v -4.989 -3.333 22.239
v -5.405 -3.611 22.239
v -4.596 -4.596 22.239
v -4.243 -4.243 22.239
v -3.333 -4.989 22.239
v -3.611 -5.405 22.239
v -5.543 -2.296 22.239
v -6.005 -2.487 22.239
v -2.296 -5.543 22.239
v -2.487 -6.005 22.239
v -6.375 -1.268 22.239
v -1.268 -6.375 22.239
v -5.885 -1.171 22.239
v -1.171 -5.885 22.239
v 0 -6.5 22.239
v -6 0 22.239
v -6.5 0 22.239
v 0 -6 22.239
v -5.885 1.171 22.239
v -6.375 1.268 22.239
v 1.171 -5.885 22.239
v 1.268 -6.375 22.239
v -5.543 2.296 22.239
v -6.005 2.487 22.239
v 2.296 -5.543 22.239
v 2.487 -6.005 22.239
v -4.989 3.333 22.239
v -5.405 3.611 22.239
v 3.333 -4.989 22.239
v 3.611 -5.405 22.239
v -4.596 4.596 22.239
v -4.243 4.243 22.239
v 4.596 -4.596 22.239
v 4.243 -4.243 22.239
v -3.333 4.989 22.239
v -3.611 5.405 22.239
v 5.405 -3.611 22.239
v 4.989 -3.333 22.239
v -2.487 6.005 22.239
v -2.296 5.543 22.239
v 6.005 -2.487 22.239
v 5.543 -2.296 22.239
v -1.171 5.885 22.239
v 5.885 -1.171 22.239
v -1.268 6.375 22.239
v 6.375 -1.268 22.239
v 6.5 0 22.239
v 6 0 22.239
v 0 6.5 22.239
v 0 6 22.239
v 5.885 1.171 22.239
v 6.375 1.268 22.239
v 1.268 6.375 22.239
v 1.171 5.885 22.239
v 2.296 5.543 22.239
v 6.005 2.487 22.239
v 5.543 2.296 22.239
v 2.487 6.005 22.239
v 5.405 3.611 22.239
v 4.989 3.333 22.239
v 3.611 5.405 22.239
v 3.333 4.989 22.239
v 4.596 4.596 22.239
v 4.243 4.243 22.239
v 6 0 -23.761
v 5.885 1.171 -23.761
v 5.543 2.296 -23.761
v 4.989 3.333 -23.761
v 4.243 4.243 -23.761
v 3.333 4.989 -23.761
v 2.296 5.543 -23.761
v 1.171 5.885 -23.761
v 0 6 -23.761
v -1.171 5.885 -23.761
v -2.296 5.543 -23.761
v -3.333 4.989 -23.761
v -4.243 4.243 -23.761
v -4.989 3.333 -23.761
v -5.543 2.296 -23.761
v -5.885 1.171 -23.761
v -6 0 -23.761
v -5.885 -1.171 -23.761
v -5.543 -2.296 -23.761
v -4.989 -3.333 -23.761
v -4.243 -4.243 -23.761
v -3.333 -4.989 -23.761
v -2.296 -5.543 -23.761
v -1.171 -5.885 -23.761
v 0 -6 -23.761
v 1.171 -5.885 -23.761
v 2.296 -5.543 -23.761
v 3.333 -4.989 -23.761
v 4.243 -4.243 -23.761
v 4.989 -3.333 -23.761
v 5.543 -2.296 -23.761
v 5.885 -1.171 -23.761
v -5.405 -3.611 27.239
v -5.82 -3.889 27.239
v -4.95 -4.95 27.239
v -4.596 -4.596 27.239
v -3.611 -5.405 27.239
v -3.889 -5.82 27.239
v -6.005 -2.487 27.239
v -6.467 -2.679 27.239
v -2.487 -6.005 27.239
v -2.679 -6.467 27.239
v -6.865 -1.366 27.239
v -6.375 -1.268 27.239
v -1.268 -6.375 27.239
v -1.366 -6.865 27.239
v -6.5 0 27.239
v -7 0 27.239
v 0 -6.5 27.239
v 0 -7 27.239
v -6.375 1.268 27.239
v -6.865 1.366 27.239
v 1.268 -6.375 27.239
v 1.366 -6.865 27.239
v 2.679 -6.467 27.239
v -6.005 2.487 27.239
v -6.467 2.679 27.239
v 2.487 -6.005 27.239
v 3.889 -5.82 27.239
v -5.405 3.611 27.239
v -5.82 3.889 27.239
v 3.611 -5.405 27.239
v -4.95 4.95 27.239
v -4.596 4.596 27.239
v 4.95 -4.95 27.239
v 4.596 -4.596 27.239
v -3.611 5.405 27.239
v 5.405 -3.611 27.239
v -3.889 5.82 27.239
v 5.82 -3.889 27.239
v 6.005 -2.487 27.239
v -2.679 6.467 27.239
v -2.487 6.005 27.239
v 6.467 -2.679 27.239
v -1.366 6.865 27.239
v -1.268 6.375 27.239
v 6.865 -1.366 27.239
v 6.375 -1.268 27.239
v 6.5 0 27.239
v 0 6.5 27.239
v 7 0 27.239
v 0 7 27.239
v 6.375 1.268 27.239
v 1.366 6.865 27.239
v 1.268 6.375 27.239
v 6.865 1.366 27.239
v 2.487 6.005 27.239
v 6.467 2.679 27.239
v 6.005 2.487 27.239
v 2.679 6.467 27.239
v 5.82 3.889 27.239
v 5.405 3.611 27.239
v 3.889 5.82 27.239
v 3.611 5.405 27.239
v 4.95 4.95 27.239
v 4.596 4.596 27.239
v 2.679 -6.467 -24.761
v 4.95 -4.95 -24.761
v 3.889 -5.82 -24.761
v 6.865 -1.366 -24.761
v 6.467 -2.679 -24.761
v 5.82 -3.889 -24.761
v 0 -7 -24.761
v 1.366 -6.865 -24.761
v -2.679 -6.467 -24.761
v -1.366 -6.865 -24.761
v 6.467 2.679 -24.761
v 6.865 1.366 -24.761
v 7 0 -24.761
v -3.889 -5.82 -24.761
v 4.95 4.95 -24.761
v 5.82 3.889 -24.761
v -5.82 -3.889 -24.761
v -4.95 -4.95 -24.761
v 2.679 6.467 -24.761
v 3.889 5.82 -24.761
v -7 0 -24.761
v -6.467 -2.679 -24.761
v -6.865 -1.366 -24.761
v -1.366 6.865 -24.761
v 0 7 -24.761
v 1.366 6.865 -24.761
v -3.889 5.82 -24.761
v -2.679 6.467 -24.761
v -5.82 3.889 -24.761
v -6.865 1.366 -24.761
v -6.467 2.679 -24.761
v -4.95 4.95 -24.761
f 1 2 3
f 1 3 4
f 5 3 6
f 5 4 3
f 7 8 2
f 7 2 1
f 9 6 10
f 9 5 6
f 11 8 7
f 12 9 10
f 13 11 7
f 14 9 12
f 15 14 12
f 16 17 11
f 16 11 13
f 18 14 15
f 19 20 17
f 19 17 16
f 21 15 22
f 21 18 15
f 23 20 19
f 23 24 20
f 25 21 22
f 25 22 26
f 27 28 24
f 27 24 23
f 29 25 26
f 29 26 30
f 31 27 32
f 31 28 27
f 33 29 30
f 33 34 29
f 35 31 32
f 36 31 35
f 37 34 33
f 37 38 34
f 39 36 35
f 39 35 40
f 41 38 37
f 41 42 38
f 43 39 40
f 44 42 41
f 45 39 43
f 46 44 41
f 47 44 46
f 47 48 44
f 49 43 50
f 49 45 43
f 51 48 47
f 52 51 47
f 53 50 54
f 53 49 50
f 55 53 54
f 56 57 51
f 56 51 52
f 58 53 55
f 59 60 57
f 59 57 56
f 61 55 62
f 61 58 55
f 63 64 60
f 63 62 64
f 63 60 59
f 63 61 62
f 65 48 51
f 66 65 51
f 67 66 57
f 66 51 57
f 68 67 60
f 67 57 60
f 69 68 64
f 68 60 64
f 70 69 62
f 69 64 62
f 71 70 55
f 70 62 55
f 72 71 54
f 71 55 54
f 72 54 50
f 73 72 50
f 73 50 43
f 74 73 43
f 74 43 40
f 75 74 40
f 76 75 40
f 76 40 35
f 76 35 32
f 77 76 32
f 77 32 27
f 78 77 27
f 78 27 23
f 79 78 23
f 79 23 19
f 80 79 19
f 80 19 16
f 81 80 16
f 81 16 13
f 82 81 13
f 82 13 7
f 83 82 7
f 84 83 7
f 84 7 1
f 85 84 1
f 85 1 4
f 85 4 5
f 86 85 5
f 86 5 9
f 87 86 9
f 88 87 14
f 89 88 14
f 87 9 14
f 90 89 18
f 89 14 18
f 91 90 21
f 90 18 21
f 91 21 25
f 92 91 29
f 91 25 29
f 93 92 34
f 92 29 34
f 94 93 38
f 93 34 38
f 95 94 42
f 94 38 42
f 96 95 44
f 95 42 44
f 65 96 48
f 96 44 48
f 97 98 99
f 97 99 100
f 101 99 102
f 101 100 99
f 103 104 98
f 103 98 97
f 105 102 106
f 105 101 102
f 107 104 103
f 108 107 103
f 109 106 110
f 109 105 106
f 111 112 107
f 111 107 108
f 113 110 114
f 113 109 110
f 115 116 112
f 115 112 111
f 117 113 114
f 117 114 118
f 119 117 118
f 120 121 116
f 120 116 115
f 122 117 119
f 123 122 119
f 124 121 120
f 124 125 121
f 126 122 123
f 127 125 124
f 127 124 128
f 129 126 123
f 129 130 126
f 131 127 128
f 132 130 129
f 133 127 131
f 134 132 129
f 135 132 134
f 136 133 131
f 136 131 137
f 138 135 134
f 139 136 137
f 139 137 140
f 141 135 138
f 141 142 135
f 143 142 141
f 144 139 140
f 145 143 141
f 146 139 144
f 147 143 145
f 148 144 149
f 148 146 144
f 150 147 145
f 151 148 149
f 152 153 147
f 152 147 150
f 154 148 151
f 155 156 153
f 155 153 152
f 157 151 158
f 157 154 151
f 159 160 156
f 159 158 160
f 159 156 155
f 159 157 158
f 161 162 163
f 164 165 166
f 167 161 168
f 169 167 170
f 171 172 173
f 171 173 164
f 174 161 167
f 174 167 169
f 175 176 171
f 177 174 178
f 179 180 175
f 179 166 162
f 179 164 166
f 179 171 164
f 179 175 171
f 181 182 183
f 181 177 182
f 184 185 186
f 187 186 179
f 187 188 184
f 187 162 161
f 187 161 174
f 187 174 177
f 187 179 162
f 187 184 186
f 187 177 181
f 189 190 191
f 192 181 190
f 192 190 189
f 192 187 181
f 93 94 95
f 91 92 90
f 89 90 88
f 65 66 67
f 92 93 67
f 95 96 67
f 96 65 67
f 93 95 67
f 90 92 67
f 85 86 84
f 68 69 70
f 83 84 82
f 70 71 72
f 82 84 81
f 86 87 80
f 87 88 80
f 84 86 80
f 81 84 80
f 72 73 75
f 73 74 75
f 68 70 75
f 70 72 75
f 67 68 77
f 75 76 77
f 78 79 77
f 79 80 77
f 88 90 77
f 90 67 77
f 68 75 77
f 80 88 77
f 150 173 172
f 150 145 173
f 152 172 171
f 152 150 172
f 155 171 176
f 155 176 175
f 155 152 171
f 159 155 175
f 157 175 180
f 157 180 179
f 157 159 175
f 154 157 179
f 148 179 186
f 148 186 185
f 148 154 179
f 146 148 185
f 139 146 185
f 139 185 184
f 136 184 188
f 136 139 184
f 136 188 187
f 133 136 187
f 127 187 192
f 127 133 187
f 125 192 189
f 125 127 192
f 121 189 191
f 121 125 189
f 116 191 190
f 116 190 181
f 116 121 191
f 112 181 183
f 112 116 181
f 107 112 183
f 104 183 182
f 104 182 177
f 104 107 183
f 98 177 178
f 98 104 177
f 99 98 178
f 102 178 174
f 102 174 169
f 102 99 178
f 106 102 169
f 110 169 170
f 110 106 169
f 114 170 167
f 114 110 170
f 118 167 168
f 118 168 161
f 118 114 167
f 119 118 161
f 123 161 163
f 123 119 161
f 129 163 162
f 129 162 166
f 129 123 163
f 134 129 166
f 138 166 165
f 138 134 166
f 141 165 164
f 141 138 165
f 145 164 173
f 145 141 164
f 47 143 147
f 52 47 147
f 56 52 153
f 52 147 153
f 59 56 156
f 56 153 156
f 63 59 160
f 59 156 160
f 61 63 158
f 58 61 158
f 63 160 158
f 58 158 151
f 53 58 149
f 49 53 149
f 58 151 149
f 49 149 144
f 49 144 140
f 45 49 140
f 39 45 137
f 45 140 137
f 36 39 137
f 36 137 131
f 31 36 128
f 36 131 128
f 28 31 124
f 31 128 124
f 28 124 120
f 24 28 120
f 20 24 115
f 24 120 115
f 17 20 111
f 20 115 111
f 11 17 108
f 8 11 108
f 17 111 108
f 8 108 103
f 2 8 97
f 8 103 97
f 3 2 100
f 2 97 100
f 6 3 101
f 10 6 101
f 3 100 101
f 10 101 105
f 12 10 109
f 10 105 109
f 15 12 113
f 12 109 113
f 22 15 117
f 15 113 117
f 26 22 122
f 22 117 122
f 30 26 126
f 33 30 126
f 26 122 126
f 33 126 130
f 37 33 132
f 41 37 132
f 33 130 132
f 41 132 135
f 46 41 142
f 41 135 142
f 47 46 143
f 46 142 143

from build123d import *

# Parameters (mm, degrees)
F2_T     = -1
F3_R     = 6.5
F4_DEPTH = 5


with BuildPart() as f1:
    # F0 (on Front) → F1 (revolve)
    with BuildSketch(Plane.XZ):
        Polygon((0, 27.239302), (0, 0), (0, -24.760698), (7, -24.760698), (7, 27.239302), align=None)
    revolve(axis=Axis((0, 0, 13.619651), (0, 0, 1)))

    # F2
    f2_openings = [f1.faces().sort_by_distance(p)[0] for p in [
        (0, 0, 27.239302),
    ]]
    offset(amount=F2_T, openings=f2_openings)

    # F3 (on face) → F4 (cut)
    with BuildSketch(Plane.XY.offset(27.239302)):
        Circle(F3_R)
    extrude(amount=-F4_DEPTH, mode=Mode.SUBTRACT)


solid = f1.part
